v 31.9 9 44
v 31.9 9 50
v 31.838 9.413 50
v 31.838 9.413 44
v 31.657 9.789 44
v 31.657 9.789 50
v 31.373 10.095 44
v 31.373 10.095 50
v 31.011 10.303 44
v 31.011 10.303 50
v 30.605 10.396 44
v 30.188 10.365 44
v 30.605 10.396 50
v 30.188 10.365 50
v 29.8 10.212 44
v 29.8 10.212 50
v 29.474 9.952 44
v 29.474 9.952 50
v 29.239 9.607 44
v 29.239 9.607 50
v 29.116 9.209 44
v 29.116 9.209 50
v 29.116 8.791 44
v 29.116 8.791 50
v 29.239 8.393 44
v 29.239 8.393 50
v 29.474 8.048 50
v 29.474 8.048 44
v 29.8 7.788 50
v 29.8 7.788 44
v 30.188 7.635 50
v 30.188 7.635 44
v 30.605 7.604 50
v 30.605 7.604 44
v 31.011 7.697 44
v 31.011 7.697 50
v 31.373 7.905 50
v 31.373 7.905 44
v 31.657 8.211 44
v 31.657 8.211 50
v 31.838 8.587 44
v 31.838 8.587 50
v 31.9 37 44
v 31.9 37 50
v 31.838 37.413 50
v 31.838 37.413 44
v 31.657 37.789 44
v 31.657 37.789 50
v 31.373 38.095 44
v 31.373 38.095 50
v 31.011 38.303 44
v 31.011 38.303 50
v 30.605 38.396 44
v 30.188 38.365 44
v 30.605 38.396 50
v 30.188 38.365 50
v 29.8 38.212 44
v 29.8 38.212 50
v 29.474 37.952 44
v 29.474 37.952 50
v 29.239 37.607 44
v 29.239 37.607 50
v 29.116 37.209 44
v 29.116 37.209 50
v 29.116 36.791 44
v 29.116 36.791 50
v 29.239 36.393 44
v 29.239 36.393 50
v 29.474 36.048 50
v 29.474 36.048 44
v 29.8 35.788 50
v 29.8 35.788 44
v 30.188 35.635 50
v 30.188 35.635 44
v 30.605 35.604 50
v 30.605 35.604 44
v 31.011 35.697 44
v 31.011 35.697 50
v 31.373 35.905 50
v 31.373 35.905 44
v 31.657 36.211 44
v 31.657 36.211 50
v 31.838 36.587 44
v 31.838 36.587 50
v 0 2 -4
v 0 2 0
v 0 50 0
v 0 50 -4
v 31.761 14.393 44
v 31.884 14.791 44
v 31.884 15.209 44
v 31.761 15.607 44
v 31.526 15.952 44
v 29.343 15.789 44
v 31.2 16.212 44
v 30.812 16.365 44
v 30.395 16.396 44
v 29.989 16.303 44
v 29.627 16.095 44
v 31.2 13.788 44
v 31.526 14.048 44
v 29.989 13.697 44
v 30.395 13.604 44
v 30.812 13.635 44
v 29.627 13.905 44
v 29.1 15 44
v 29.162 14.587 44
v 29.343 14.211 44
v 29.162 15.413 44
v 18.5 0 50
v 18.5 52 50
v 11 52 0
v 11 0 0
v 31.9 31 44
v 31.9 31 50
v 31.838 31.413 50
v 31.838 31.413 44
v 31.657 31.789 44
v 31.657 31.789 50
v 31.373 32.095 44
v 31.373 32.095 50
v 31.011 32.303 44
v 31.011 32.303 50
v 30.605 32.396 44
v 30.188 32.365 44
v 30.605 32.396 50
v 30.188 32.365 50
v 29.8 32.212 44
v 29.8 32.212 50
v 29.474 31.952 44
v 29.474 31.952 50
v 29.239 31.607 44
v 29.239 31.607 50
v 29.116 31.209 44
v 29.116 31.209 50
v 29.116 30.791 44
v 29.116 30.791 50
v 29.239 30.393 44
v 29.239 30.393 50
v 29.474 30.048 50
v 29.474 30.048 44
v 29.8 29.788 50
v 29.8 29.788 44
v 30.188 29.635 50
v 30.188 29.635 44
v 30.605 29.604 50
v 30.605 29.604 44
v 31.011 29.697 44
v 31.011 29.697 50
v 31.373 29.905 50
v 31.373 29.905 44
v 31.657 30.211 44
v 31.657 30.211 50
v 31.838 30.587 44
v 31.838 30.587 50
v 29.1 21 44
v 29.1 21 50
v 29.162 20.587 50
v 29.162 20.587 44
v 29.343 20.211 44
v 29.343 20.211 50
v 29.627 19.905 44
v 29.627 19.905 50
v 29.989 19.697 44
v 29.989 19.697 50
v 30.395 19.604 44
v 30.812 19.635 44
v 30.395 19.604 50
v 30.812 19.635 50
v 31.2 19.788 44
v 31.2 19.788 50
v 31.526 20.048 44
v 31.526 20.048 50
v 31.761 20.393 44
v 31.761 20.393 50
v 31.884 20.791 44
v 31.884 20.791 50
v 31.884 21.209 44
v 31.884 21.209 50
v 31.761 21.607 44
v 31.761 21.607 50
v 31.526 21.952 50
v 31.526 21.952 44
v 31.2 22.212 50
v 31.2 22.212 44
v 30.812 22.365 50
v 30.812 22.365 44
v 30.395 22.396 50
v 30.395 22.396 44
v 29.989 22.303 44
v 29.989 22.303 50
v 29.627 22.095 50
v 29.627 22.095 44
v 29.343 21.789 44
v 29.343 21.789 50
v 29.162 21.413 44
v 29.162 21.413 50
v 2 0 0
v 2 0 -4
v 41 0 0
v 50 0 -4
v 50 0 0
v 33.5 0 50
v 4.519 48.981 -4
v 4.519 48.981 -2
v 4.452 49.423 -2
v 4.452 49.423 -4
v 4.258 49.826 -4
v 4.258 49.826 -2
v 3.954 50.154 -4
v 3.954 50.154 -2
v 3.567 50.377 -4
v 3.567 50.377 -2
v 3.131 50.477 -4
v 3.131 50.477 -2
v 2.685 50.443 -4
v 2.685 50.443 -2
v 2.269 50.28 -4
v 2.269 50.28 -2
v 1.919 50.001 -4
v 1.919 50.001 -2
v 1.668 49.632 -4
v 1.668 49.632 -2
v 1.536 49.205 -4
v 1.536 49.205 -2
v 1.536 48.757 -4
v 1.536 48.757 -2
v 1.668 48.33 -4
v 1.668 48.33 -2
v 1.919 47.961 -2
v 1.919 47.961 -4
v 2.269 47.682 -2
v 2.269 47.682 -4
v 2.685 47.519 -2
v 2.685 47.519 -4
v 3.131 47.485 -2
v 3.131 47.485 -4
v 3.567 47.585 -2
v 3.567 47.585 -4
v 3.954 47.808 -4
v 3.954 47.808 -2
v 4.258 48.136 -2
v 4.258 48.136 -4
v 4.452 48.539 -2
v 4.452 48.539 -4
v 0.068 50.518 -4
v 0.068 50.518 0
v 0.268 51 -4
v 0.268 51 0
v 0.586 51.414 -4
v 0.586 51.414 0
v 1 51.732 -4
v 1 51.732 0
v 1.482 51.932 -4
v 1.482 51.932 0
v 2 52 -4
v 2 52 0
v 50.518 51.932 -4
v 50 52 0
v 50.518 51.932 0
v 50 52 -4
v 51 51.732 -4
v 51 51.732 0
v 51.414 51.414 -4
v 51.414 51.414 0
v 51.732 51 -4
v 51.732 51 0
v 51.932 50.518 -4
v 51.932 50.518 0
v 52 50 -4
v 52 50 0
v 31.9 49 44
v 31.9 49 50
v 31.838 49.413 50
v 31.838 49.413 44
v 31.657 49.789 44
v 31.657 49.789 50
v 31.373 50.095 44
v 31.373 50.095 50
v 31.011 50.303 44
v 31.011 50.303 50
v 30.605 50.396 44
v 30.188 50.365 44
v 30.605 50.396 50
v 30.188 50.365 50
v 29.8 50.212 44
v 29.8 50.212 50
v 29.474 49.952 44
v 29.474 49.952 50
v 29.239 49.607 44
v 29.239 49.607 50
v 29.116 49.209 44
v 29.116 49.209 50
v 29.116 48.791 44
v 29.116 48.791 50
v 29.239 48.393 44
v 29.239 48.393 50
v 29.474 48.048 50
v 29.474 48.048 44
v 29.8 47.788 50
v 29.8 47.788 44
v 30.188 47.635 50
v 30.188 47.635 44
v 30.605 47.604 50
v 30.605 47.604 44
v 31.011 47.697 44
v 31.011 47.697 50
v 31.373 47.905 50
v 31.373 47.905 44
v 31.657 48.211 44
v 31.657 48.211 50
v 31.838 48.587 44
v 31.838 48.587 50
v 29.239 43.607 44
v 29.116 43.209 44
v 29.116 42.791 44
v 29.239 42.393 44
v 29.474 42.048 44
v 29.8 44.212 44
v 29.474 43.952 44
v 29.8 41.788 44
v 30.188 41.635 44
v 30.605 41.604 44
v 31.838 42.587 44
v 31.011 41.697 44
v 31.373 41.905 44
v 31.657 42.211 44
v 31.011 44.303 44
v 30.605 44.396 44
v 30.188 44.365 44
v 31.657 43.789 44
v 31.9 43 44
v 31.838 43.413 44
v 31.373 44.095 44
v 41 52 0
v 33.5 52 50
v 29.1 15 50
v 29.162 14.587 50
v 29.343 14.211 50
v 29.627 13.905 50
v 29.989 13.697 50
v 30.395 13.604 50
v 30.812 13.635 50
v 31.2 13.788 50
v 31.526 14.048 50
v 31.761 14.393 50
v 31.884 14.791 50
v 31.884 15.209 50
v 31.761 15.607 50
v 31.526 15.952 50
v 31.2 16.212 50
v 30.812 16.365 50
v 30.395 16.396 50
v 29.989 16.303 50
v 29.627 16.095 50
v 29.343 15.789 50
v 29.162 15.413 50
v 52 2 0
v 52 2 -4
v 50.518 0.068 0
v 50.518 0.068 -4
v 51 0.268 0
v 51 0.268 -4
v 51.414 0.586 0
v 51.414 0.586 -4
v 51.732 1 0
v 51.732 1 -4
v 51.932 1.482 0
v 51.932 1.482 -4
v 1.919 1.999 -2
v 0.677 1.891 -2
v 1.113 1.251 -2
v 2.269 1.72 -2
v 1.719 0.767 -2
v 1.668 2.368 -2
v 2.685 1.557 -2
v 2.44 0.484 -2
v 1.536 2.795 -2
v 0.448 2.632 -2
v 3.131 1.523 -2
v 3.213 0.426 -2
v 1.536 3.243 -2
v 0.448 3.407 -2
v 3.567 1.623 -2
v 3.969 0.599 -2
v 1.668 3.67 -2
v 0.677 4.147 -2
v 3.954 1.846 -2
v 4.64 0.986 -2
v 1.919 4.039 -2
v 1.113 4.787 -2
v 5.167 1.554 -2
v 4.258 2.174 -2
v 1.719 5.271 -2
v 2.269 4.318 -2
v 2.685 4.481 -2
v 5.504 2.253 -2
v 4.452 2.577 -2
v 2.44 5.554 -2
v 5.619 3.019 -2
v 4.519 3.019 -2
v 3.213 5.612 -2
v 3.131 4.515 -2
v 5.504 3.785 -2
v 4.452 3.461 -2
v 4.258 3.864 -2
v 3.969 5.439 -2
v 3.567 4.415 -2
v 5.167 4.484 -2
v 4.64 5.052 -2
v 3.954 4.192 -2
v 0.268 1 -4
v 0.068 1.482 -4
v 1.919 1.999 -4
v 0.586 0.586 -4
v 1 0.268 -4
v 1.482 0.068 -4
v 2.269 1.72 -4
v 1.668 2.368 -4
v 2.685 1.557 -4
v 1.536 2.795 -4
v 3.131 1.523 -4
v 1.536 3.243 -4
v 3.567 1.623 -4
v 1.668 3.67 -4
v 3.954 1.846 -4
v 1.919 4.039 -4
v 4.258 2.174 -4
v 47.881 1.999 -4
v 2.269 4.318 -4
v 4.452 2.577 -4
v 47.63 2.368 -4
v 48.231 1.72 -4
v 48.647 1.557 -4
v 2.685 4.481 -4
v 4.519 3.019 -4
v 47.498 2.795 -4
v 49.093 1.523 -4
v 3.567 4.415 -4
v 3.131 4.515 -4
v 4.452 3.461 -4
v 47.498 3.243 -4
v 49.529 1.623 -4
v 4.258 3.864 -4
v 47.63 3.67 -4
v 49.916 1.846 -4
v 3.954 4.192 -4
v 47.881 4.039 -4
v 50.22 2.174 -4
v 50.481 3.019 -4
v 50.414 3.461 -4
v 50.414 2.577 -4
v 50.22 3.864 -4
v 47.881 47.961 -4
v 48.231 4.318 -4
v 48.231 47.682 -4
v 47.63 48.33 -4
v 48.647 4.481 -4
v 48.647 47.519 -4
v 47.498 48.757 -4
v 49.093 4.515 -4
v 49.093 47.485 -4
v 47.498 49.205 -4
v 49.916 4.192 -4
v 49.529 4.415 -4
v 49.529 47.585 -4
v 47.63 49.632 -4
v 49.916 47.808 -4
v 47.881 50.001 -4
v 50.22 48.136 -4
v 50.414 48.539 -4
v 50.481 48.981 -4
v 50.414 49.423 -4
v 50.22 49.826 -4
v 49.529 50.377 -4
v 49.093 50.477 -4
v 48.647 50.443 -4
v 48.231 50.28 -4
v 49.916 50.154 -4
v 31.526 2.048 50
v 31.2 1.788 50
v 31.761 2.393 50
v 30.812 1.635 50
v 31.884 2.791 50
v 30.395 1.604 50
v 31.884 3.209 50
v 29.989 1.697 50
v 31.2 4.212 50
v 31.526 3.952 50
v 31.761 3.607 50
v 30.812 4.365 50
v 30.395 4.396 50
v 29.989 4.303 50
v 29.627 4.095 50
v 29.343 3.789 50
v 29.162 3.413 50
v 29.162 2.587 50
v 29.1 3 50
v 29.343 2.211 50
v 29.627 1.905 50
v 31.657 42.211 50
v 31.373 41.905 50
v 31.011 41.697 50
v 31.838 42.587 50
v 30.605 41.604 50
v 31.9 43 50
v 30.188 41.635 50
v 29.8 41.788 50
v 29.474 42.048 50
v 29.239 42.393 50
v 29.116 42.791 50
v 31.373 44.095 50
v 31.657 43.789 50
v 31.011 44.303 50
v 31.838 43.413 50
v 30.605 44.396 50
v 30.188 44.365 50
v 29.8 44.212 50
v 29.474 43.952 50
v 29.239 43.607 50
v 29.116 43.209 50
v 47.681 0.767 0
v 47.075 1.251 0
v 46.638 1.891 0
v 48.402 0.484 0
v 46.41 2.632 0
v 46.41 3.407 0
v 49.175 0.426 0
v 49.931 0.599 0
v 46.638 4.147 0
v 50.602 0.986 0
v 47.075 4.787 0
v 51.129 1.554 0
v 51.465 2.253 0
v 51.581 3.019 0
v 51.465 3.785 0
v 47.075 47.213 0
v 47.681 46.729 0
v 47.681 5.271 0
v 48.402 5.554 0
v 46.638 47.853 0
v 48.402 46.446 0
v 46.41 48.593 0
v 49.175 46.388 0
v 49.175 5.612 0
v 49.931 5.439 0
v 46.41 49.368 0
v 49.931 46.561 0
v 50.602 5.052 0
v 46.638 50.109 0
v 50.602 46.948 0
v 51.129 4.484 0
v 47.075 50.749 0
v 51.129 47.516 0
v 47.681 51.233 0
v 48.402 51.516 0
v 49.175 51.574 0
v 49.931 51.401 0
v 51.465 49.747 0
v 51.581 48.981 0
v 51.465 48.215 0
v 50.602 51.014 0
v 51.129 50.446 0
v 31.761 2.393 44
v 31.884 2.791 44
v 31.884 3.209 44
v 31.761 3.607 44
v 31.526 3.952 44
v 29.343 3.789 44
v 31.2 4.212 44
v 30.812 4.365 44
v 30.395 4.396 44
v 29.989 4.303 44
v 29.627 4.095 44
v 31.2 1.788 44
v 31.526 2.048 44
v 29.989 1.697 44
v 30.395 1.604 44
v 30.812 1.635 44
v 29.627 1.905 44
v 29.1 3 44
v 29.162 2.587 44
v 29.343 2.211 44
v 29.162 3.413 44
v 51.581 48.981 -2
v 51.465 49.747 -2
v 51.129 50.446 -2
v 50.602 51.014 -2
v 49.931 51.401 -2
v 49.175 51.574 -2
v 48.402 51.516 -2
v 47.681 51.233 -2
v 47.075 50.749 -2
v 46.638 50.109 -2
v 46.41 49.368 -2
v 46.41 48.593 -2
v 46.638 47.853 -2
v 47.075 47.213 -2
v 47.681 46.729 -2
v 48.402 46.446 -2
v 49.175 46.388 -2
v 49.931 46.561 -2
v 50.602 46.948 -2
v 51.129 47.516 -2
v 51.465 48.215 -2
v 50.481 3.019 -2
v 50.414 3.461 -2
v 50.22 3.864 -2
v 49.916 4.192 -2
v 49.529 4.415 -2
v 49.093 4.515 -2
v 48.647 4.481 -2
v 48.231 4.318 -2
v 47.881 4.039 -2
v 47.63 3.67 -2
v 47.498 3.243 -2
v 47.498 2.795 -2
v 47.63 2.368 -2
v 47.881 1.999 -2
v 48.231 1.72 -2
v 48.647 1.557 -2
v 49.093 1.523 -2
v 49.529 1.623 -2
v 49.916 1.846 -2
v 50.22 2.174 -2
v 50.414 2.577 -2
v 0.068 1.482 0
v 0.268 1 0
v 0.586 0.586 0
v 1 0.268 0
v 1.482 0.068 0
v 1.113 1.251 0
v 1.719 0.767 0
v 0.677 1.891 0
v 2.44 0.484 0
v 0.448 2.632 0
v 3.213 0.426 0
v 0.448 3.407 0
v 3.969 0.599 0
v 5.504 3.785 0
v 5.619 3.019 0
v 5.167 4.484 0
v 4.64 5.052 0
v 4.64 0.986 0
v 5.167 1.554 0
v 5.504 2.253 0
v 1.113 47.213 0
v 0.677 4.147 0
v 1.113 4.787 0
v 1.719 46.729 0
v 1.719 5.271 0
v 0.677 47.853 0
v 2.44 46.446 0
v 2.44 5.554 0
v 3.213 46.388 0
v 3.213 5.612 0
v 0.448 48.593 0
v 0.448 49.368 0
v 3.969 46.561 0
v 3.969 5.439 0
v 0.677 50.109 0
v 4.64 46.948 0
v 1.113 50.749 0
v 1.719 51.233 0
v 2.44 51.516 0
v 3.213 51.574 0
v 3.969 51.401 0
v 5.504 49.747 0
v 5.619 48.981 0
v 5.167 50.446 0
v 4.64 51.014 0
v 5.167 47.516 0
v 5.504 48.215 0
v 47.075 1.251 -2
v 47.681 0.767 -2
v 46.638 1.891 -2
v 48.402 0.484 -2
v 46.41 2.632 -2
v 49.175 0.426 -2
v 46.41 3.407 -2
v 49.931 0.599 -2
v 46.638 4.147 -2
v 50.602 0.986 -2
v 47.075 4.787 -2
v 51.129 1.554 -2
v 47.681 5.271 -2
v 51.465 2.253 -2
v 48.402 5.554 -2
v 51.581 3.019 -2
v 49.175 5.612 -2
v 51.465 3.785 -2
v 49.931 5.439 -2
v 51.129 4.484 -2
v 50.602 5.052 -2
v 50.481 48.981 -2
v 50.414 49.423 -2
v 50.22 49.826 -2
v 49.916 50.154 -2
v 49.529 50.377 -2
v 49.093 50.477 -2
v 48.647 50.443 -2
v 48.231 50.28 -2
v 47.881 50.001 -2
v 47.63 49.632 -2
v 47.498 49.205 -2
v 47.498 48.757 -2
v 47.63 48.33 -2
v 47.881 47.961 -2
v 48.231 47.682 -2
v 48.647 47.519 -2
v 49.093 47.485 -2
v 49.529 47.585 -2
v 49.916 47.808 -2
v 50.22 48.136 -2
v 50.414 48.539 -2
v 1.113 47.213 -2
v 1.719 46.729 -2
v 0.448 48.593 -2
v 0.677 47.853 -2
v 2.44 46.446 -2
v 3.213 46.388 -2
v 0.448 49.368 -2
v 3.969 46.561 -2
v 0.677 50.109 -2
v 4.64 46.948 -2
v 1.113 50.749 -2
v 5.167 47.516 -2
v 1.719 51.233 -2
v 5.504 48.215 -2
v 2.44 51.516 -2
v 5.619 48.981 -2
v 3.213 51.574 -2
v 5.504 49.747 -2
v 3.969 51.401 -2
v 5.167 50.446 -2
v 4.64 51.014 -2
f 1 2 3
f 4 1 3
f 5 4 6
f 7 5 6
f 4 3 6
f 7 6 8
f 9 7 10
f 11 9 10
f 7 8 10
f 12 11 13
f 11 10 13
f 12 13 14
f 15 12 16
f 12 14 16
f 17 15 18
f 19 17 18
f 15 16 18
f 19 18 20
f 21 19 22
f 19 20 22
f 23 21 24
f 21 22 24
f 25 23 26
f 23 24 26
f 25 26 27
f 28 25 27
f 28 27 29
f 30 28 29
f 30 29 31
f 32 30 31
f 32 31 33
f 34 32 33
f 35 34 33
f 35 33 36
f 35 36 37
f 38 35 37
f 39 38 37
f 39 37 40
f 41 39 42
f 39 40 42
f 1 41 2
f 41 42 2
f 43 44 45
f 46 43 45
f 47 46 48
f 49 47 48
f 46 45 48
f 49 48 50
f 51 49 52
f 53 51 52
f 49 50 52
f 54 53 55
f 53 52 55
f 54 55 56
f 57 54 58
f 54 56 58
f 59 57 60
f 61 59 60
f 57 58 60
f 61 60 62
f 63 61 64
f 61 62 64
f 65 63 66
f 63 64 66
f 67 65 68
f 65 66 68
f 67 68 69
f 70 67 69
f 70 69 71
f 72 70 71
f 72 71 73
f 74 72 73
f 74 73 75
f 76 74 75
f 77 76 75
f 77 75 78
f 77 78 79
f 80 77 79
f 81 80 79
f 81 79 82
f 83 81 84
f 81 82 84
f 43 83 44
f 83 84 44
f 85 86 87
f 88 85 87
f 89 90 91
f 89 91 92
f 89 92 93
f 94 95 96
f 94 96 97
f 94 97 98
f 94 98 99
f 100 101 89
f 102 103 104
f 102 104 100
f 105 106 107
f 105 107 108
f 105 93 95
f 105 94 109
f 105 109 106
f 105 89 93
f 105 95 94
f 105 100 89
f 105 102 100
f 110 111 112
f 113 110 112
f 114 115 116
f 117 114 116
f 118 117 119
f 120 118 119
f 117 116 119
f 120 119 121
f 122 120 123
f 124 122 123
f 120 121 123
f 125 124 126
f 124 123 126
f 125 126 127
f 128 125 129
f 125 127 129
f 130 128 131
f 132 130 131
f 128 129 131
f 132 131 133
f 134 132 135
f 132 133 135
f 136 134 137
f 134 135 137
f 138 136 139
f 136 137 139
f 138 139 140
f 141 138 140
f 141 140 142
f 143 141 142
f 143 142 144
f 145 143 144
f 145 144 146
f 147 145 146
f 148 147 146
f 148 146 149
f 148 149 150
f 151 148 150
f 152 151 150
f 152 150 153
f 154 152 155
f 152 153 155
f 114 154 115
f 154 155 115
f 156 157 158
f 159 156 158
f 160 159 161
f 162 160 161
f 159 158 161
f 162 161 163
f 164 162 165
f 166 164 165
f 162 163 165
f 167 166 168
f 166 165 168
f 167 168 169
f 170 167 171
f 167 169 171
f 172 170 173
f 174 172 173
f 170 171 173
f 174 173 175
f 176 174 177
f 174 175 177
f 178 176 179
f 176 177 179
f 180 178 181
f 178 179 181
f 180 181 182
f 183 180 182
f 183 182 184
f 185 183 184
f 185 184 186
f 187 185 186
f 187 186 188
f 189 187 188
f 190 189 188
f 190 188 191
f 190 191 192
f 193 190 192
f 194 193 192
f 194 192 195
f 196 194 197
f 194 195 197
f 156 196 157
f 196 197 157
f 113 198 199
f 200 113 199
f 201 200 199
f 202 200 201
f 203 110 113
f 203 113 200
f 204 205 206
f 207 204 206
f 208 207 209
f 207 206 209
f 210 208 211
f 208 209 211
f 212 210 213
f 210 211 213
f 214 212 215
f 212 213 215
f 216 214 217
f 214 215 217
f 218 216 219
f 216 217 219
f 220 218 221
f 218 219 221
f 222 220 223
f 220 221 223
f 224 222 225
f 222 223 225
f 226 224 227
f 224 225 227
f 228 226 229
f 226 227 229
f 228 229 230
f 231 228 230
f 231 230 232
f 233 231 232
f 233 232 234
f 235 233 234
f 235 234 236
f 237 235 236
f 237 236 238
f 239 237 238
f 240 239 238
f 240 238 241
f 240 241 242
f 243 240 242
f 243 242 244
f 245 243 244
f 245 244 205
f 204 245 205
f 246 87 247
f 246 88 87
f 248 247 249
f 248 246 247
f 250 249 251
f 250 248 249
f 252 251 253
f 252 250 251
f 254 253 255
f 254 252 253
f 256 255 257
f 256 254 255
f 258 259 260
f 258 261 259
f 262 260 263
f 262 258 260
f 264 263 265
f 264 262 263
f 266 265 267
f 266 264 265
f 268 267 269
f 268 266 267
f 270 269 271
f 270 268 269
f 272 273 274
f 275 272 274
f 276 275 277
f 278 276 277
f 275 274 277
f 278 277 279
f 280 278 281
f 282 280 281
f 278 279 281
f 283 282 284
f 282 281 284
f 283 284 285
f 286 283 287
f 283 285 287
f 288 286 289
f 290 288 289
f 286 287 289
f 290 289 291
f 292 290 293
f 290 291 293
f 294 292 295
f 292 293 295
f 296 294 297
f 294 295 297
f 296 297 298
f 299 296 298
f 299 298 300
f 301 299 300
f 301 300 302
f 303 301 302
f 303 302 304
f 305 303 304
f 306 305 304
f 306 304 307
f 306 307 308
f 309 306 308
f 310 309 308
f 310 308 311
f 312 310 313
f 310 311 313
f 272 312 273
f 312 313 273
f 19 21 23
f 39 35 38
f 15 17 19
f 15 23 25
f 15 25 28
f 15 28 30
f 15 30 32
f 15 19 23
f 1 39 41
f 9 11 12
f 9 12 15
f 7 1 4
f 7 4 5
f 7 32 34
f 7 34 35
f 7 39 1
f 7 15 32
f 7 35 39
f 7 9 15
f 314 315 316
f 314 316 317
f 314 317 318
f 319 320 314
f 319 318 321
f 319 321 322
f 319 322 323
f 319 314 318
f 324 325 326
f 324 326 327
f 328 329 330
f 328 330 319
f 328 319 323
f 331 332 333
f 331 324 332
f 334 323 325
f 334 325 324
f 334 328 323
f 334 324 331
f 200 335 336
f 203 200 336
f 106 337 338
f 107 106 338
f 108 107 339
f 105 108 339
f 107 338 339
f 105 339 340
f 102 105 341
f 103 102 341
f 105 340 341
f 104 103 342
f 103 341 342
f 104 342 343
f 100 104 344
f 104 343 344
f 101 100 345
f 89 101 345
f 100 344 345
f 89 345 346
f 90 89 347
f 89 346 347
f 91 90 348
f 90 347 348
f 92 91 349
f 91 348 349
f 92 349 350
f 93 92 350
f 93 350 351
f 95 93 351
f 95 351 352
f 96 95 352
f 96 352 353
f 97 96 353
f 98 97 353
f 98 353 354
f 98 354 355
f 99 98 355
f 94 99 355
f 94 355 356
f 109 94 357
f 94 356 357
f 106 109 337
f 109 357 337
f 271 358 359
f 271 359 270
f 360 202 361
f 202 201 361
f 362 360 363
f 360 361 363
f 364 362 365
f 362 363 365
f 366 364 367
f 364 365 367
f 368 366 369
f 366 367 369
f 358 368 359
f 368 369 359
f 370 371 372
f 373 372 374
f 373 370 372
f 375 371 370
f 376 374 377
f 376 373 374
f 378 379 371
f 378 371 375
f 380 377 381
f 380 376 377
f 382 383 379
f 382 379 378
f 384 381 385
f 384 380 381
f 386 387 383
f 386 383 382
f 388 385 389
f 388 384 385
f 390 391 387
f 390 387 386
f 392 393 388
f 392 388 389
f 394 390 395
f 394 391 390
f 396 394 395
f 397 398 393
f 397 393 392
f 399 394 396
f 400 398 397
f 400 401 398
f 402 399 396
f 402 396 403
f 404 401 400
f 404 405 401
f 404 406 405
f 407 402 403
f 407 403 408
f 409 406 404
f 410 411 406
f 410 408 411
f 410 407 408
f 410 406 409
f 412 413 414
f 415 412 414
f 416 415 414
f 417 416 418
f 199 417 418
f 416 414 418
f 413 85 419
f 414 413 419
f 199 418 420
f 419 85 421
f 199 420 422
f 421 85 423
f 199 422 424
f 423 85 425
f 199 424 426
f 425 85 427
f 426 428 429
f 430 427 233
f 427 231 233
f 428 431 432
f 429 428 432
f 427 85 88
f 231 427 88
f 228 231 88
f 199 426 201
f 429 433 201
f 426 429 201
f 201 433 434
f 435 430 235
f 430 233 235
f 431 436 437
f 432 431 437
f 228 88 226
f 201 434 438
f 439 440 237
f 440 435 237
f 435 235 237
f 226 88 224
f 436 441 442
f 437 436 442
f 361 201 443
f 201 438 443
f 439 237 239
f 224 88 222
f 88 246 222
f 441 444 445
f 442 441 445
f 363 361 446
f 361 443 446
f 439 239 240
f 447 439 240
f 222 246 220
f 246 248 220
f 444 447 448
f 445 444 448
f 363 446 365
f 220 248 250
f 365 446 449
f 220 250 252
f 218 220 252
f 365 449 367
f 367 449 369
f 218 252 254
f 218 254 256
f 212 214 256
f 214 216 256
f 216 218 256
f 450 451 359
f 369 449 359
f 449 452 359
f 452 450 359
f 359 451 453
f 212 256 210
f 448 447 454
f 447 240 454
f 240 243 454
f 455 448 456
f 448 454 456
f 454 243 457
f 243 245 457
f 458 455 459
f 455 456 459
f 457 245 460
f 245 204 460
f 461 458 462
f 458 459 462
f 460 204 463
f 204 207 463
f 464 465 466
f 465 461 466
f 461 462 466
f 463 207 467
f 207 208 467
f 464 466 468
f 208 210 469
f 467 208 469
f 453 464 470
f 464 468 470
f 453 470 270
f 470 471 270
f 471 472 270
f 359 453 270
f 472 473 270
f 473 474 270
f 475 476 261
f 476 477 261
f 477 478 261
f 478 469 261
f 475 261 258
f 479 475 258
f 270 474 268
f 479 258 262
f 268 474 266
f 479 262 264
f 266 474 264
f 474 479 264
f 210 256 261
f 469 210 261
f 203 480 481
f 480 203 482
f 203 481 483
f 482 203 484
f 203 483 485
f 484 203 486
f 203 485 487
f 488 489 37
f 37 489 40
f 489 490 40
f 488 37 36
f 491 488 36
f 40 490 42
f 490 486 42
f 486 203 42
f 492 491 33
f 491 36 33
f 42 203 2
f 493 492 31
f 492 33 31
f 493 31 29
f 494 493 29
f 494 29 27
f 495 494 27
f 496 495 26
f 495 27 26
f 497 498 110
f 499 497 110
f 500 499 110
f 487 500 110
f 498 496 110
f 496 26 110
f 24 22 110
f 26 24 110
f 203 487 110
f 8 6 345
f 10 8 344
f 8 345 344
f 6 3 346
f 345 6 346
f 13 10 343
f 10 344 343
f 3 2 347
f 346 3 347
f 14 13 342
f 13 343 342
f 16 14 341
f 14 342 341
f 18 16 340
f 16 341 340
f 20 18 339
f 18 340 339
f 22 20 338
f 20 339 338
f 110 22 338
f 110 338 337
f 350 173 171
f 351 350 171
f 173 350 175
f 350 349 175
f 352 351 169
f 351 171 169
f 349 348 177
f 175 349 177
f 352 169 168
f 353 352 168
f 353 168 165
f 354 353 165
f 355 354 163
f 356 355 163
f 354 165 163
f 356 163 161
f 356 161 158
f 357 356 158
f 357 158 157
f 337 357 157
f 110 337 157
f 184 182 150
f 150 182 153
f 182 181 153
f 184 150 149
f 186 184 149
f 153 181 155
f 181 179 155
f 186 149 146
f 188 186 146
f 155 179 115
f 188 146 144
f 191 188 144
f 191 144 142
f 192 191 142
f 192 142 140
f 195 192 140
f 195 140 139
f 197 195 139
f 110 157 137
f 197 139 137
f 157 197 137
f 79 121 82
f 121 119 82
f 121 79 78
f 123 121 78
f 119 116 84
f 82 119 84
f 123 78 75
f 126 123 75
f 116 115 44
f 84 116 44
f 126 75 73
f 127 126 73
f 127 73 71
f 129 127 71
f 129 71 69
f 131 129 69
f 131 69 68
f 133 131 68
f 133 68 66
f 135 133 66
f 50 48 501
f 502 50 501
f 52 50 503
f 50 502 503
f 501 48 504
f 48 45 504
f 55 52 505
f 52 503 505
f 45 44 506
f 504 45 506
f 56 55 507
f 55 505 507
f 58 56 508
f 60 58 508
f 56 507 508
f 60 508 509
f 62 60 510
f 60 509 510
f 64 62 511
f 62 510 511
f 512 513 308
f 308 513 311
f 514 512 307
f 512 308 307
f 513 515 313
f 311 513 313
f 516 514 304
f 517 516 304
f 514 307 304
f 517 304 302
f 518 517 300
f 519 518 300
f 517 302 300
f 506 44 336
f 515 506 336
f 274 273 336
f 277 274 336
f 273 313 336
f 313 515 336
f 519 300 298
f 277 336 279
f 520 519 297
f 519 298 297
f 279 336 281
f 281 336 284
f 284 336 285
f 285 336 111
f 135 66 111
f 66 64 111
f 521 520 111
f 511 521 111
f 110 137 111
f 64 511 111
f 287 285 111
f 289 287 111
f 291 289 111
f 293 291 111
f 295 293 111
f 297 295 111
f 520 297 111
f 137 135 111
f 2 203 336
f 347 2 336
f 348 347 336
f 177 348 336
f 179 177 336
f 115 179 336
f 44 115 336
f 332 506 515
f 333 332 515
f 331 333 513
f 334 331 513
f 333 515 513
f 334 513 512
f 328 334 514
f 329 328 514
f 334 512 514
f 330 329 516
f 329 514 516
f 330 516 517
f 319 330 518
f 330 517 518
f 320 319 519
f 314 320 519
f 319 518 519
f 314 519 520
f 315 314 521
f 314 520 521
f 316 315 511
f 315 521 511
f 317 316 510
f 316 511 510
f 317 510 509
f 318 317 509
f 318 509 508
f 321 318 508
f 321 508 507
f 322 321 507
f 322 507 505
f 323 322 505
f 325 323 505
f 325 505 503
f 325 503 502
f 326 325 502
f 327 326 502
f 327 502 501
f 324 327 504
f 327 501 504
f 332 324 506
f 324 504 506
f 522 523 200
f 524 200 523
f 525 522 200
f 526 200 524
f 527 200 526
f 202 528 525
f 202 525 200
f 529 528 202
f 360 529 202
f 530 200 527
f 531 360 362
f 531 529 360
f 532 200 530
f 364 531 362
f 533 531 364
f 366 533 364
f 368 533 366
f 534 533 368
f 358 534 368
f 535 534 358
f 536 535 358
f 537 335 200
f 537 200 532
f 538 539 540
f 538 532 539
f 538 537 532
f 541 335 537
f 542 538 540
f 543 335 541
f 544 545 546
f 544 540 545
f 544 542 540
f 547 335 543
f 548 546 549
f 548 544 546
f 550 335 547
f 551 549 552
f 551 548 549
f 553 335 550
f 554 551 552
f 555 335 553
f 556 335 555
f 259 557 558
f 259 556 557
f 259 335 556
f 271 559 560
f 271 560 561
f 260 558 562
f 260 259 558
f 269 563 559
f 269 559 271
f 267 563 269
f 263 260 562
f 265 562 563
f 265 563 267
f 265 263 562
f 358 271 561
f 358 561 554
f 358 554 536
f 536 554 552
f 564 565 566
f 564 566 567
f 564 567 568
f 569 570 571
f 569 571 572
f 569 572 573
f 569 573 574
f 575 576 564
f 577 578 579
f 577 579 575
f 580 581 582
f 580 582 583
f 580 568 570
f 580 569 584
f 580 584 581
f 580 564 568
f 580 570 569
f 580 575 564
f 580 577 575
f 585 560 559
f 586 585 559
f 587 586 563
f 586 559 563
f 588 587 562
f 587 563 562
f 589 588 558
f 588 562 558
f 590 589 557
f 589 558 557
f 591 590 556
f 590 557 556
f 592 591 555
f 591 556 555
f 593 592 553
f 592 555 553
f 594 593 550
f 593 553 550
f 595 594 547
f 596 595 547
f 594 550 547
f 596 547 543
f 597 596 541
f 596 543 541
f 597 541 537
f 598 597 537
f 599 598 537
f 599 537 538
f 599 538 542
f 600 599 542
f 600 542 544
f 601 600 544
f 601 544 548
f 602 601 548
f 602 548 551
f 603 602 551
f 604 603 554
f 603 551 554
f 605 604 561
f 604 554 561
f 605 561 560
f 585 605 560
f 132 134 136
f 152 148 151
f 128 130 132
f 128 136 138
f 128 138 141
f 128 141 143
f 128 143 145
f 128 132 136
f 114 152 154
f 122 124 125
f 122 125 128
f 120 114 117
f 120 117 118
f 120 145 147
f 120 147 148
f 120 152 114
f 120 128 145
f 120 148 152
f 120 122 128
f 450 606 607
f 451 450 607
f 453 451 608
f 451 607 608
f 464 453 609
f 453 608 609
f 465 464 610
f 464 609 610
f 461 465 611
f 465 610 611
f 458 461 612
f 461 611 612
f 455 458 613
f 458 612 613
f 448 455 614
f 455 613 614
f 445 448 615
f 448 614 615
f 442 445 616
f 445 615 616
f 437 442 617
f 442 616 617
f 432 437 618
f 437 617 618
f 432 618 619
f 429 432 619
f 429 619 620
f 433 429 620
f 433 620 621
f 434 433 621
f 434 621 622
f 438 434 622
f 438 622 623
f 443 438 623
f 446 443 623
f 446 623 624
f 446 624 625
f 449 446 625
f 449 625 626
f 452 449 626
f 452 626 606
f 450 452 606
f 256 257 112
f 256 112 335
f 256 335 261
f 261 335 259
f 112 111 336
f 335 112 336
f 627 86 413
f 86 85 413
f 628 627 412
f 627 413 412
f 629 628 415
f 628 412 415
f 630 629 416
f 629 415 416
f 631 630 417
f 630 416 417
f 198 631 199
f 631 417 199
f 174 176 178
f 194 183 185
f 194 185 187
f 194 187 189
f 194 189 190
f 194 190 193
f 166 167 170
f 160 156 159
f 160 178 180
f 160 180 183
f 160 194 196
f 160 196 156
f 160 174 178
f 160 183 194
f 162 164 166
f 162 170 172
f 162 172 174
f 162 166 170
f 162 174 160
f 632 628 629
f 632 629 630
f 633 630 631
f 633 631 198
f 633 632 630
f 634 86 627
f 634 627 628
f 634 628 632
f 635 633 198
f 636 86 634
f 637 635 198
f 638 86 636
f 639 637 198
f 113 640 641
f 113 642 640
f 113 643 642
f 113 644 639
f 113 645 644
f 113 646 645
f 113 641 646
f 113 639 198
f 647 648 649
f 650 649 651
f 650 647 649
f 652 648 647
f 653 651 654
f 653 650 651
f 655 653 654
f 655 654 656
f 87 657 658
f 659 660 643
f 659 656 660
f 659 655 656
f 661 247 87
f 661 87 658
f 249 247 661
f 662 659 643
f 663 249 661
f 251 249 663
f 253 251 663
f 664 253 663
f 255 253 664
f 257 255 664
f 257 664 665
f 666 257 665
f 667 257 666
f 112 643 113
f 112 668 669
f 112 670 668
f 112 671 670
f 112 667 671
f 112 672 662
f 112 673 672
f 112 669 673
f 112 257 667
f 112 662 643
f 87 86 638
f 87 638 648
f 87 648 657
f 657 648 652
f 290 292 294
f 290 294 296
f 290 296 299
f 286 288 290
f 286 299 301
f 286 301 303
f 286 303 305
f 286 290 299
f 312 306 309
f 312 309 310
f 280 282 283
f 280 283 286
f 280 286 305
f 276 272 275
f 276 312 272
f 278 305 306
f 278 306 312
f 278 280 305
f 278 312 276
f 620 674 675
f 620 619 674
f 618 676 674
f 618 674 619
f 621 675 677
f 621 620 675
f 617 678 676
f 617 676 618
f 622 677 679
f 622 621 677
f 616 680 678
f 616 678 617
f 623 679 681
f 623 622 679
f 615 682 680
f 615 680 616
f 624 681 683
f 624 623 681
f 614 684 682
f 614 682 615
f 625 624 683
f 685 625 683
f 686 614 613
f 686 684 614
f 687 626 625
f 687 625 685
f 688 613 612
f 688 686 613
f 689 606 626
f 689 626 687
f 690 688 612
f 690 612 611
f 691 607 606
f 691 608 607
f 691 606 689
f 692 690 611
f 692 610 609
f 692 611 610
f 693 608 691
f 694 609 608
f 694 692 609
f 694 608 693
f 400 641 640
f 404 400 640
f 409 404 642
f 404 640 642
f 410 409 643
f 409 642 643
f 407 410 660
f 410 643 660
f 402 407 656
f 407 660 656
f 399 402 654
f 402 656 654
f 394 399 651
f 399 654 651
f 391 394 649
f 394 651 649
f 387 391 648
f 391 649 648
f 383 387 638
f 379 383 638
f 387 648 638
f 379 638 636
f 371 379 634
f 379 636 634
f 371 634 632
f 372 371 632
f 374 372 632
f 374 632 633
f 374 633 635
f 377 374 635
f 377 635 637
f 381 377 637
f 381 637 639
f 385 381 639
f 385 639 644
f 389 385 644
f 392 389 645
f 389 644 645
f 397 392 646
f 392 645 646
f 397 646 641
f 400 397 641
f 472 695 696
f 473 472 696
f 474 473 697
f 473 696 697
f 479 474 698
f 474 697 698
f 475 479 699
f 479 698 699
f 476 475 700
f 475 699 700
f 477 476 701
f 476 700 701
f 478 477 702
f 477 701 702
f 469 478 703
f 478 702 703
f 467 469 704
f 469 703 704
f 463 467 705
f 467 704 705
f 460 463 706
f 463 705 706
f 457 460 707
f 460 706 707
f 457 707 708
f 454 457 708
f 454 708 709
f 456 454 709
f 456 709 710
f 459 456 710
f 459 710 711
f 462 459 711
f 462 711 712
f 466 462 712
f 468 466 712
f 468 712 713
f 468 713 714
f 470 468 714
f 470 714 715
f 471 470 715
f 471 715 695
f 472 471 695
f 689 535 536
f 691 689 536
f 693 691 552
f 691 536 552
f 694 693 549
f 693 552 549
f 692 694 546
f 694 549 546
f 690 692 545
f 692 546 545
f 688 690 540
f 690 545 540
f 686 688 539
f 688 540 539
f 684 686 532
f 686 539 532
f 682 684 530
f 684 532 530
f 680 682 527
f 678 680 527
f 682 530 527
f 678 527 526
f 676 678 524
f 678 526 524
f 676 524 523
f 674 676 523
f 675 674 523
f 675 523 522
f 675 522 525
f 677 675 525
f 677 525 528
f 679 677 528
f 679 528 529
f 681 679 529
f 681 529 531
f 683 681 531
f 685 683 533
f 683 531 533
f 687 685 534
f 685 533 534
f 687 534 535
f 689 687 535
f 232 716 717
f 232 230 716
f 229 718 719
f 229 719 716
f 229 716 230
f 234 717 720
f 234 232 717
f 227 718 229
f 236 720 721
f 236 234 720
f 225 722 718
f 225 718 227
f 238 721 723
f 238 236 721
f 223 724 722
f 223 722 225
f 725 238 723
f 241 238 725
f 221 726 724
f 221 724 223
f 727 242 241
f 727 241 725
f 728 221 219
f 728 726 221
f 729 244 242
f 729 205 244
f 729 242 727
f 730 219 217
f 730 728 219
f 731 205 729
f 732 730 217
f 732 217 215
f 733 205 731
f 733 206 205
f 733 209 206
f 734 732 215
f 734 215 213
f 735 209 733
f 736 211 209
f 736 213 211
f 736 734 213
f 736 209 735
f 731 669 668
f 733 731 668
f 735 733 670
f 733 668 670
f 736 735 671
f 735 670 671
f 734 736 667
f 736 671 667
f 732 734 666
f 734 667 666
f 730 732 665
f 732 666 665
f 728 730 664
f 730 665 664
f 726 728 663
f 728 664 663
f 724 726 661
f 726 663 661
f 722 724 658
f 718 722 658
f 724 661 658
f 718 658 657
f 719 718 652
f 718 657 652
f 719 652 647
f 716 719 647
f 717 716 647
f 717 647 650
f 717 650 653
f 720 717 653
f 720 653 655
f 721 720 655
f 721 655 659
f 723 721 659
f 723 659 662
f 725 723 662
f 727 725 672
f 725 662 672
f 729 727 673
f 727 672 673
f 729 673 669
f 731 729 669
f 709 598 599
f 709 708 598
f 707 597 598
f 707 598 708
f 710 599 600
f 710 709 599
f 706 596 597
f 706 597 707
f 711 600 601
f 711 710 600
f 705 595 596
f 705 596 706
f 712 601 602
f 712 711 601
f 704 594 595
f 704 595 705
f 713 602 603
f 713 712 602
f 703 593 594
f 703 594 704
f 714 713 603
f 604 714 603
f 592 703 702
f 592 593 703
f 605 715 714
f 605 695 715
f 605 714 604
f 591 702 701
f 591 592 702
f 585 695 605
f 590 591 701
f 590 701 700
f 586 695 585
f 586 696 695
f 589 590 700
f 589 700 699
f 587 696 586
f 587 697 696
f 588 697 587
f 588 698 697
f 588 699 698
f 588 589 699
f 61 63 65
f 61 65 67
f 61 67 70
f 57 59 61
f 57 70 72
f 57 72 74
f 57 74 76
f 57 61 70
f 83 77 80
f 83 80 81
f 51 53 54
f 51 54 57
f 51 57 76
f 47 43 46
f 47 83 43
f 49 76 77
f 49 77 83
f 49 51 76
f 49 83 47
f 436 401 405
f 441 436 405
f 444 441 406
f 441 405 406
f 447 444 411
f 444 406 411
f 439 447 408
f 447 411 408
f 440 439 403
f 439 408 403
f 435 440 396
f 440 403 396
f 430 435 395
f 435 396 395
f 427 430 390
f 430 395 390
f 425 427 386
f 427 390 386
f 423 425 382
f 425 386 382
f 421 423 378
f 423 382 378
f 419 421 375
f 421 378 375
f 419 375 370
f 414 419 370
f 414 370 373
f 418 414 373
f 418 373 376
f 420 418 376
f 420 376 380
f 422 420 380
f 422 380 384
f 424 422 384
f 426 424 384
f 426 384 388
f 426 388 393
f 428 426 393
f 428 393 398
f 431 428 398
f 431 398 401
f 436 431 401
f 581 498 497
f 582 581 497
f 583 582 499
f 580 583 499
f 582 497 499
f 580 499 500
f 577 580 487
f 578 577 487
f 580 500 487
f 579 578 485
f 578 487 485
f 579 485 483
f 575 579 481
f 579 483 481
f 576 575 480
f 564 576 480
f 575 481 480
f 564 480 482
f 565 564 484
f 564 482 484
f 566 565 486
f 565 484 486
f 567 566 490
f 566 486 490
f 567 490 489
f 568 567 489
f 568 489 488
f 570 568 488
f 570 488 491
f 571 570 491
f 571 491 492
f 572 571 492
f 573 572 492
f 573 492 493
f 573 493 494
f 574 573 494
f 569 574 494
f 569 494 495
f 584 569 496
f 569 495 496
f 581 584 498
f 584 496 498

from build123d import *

# Parameters (mm, degrees)
SKETCH1_W           = 52
SKETCH1_H           = 52
BOSS_EXTRUDE1_DEPTH = 4
BOSS_EXTRUDE2_DEPTH = 52
SKETCH5_R           = 1.4
CUT_EXTRUDE4_DEPTH  = 6
SKETCH6_R           = 1.5
CUT_EXTRUDE5_DEPTH  = 6
SKETCH7_R           = 2.6
CUT_EXTRUDE6_DEPTH  = 2
FILLET1_R           = 2


with BuildPart() as part:
    # Sketch1 → Boss-Extrude1 (new body)
    with BuildSketch(Plane.XY):
        with Locations((26, 26)):
            Rectangle(SKETCH1_W, SKETCH1_H)
    extrude(amount=-BOSS_EXTRUDE1_DEPTH)

    # Sketch4 → Boss-Extrude2 (add)
    with BuildSketch(Plane(origin=(0, 52, 0), x_dir=(1, 0, 0), z_dir=(0, 1, 0))):
        Polygon((11, 0), (41, 0), (33.5, -50), (18.5, -50), align=None)
    extrude(amount=-BOSS_EXTRUDE2_DEPTH)

    # Sketch5 → Cut-Extrude4 (cut)
    with BuildSketch(Plane.XY.offset(50)):
        with Locations((30.5, 9)):
            Circle(SKETCH5_R)
        with Locations(Location((30.5, 3, 0), (0, 0, 180))):
            Circle(SKETCH5_R)
        with Locations(Location((30.5, 15, 0), (0, 0, 180))):
            Circle(SKETCH5_R)
        with Locations(Location((30.5, 21, 0), (0, 0, 180))):
            Circle(SKETCH5_R)
        with Locations((30.5, 31)):
            Circle(SKETCH5_R)
        with Locations((30.5, 37)):
            Circle(SKETCH5_R)
        with Locations((30.5, 43)):
            Circle(SKETCH5_R)
        with Locations((30.5, 49)):
            Circle(SKETCH5_R)
    extrude(amount=-CUT_EXTRUDE4_DEPTH, mode=Mode.SUBTRACT)

    # Sketch6 → Cut-Extrude5 (cut)
    with BuildSketch(Plane.XY):
        with Locations((48.980970389, 48.980970389)):
            Circle(SKETCH6_R)
        with Locations((48.980970389, 3.019029611)):
            Circle(SKETCH6_R)
        with Locations((3.019029611, 3.019029611)):
            Circle(SKETCH6_R)
        with Locations((3.019029611, 48.980970389)):
            Circle(SKETCH6_R)
    extrude(amount=-CUT_EXTRUDE5_DEPTH, mode=Mode.SUBTRACT)

    # Sketch7 → Cut-Extrude6 (cut)
    with BuildSketch(Plane.XY):
        with Locations((48.980970389, 48.980970389)):
            Circle(SKETCH7_R)
        with Locations((3.019029611, 48.980970389)):
            Circle(SKETCH7_R)
        with Locations((3.019029611, 3.019029611)):
            Circle(SKETCH7_R)
        with Locations((48.980970389, 3.019029611)):
            Circle(SKETCH7_R)
    extrude(amount=-CUT_EXTRUDE6_DEPTH, mode=Mode.SUBTRACT)

    # Fillet1
    fillet1_edges = [part.edges().sort_by_distance(p)[0] for p in [
        (0, 0, -2),
        (0, 52, -2),
        (52, 52, -2),
        (52, 0, -2),
    ]]
    fillet(fillet1_edges, radius=FILLET1_R)


solid = part.part
